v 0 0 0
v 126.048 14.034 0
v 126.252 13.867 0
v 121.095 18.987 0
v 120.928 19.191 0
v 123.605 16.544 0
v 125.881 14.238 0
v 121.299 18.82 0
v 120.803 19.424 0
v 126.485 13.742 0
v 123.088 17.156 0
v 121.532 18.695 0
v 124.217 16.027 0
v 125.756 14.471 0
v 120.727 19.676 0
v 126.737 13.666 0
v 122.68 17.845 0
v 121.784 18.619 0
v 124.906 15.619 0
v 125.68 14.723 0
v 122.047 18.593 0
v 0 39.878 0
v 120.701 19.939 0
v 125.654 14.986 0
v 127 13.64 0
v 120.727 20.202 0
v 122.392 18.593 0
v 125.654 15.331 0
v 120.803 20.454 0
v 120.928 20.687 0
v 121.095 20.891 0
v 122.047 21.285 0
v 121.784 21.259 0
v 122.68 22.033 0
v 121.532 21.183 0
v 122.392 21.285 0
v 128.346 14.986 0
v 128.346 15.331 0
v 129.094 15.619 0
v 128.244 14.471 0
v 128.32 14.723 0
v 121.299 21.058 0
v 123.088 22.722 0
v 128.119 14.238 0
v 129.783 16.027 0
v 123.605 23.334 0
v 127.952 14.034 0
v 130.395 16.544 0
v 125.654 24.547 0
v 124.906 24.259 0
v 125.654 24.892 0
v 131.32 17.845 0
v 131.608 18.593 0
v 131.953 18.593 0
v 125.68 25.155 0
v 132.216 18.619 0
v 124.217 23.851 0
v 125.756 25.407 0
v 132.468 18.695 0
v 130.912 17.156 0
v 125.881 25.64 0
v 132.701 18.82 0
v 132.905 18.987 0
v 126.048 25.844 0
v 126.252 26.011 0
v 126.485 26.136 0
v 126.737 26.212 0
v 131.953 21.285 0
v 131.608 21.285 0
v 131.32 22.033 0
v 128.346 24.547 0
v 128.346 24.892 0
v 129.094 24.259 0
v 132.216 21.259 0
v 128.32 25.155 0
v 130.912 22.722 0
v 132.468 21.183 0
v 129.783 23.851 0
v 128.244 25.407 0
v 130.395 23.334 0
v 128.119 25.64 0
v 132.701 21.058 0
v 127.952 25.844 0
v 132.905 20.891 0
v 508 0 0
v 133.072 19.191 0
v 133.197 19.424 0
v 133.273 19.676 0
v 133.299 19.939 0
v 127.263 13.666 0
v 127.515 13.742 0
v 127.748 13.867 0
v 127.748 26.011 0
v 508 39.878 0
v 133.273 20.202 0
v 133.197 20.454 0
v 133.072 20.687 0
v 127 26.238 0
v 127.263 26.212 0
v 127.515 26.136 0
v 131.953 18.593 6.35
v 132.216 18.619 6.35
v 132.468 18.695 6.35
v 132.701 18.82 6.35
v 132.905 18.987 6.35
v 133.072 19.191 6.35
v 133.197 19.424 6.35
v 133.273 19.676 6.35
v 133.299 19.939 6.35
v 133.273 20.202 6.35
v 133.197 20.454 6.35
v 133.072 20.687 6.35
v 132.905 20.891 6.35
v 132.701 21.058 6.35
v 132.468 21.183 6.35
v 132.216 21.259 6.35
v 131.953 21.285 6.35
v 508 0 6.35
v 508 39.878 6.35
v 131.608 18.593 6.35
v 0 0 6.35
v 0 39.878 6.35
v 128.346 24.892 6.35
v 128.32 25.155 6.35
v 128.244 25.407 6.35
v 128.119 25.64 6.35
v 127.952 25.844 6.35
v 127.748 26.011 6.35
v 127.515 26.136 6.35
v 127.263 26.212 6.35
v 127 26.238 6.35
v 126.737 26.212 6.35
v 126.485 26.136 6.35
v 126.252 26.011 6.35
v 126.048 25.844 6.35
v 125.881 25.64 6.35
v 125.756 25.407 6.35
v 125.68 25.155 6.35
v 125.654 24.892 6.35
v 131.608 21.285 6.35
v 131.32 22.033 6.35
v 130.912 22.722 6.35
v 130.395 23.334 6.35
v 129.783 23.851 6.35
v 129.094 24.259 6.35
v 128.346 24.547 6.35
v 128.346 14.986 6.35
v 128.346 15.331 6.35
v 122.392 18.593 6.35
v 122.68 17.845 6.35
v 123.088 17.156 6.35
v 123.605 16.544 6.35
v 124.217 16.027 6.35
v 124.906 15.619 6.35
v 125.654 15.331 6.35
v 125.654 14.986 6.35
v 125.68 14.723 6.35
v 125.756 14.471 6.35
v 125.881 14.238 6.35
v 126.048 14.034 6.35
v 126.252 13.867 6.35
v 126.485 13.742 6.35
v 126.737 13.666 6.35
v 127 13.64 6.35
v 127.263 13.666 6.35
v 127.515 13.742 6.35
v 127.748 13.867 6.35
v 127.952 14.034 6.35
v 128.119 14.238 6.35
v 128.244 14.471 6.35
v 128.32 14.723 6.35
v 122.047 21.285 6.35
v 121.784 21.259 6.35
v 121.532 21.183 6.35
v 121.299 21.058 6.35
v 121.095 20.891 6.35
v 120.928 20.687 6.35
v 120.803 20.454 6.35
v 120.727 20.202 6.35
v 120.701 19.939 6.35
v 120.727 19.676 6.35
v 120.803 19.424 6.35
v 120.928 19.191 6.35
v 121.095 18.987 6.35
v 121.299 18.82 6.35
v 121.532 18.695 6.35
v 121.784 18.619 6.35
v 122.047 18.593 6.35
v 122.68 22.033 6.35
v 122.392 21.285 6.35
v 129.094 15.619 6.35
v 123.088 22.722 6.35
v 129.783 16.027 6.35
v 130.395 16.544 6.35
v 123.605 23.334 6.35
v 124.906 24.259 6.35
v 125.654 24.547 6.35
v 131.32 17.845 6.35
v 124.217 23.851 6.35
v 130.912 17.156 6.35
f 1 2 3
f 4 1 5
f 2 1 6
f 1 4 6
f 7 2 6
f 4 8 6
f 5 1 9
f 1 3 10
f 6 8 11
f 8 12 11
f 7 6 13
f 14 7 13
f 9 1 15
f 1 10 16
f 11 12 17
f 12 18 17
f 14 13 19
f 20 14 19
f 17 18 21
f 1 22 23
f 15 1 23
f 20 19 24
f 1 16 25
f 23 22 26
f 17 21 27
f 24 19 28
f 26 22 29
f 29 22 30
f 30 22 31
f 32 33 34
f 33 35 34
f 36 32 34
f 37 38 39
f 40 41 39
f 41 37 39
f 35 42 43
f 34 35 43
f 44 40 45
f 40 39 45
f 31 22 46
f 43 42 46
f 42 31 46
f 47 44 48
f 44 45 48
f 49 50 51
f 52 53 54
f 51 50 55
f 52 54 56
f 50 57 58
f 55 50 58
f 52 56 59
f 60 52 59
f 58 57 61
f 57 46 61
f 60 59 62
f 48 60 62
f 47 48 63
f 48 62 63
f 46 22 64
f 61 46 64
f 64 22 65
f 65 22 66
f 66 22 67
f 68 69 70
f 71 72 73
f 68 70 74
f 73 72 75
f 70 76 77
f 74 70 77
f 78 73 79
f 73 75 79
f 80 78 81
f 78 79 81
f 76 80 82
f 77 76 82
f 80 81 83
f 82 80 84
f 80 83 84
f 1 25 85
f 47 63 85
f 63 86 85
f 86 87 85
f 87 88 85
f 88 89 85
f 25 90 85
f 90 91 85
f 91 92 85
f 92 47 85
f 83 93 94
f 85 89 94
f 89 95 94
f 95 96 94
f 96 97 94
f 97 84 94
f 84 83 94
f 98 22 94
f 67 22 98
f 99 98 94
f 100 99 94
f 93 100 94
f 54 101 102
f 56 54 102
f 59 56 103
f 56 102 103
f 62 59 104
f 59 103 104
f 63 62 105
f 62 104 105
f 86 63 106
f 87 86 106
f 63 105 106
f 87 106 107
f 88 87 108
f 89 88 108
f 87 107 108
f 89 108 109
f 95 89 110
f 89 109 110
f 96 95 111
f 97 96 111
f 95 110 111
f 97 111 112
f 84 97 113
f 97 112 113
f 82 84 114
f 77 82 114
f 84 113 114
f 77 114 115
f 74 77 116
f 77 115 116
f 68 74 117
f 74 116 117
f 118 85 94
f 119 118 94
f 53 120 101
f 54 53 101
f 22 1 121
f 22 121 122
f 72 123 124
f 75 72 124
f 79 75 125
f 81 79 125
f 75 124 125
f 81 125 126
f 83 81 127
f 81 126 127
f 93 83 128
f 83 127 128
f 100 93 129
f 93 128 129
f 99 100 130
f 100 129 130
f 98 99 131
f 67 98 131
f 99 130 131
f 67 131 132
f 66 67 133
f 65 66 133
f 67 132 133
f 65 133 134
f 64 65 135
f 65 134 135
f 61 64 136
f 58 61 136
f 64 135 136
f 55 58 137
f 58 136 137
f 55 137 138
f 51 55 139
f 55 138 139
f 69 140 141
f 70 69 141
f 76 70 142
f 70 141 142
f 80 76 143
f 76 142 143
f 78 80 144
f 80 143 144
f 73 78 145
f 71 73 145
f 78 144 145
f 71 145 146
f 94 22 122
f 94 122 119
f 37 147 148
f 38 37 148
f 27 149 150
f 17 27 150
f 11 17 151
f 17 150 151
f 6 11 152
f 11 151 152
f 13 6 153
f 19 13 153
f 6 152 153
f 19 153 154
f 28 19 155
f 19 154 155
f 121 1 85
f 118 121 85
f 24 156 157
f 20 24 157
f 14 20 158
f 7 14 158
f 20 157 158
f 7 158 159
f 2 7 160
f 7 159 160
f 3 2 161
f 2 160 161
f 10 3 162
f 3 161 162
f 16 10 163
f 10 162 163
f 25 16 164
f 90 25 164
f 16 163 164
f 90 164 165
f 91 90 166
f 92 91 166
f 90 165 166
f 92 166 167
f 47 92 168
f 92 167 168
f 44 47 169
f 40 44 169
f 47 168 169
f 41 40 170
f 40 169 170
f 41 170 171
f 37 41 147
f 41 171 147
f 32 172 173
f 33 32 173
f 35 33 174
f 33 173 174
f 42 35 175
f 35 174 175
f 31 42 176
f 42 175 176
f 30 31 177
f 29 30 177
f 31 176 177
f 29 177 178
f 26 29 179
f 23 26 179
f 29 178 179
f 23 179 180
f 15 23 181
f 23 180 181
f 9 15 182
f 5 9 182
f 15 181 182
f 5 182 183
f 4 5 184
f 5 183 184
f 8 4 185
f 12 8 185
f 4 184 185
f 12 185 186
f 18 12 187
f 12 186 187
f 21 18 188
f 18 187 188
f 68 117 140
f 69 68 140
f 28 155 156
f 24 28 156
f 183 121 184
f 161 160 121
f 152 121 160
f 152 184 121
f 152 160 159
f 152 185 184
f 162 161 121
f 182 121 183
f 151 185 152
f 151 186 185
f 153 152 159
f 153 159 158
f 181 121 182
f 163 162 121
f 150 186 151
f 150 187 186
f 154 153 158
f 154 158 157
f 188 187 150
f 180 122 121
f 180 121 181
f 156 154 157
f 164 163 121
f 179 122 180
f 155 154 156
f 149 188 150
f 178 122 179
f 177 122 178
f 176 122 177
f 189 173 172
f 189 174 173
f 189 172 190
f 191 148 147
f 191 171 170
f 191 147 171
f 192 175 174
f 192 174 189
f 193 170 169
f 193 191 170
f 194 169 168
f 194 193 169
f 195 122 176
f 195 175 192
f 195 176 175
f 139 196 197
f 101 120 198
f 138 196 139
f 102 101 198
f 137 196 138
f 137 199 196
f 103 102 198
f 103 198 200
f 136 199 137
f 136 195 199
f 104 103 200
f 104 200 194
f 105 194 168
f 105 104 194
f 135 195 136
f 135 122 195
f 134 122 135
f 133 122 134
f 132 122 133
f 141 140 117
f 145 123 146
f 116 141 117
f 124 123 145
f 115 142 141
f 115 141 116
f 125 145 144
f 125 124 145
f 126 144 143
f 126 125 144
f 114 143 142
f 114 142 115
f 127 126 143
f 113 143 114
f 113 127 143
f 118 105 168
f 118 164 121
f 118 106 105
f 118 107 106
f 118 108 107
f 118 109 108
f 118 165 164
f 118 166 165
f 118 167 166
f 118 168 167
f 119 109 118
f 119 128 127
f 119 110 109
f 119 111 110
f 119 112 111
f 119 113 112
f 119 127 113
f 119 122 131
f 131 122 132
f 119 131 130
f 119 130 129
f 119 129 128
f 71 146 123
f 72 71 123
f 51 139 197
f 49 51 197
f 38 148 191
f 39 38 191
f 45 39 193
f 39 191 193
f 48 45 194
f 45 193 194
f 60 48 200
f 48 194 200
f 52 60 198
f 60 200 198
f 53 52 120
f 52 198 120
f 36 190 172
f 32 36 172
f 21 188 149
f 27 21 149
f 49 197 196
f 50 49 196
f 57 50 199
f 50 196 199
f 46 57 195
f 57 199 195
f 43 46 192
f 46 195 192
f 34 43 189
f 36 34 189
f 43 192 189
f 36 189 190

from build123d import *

# Parameters (mm, degrees)
SKETCH1_W           = 508
SKETCH1_H           = 39.878
BOSS_EXTRUDE1_DEPTH = 6.35
CUT_EXTRUDE3_DEPTH  = 7.35


with BuildPart() as part:
    # Sketch1 → Boss-Extrude1 (new body)
    with BuildSketch(Plane.XY):
        with Locations((254, 19.939)):
            Rectangle(SKETCH1_W, SKETCH1_H)
    extrude(amount=BOSS_EXTRUDE1_DEPTH)

    # Sketch2 → Cut-Extrude3 (cut, through all)
    with BuildSketch(Plane.XY.offset(6.35)):
        with BuildLine():
            ThreePointArc((128.3462, 24.892), (127, 26.2382), (125.6538, 24.892))
            Line((125.6538, 24.892), (125.6538, 24.546982847))
            ThreePointArc((125.6538, 24.546982847), (123.605463186, 23.333536814), (122.392017153, 21.2852))
            Line((122.392017153, 21.2852), (122.047, 21.2852))
            ThreePointArc((122.047, 21.2852), (120.7008, 19.939), (122.047, 18.5928))
            Line((122.047, 18.5928), (122.392017153, 18.5928))
            ThreePointArc((122.392017153, 18.5928), (123.605463186, 16.544463186), (125.6538, 15.331017153))
            Line((125.6538, 15.331017153), (125.6538, 14.986))
            ThreePointArc((125.6538, 14.986), (127, 13.6398), (128.3462, 14.986))
            Line((128.3462, 14.986), (128.3462, 15.331017153))
            ThreePointArc((128.3462, 15.331017153), (130.394536814, 16.544463186), (131.607982847, 18.5928))
            Line((131.607982847, 18.5928), (131.953, 18.5928))
            ThreePointArc((131.953, 18.5928), (133.2992, 19.939), (131.953, 21.2852))
            Line((131.953, 21.2852), (131.607982847, 21.2852))
            ThreePointArc((131.607982847, 21.2852), (130.394536814, 23.333536814), (128.3462, 24.546982847))
            Line((128.3462, 24.546982847), (128.3462, 24.892))
        make_face()
    extrude(amount=-CUT_EXTRUDE3_DEPTH, mode=Mode.SUBTRACT)


solid = part.part
